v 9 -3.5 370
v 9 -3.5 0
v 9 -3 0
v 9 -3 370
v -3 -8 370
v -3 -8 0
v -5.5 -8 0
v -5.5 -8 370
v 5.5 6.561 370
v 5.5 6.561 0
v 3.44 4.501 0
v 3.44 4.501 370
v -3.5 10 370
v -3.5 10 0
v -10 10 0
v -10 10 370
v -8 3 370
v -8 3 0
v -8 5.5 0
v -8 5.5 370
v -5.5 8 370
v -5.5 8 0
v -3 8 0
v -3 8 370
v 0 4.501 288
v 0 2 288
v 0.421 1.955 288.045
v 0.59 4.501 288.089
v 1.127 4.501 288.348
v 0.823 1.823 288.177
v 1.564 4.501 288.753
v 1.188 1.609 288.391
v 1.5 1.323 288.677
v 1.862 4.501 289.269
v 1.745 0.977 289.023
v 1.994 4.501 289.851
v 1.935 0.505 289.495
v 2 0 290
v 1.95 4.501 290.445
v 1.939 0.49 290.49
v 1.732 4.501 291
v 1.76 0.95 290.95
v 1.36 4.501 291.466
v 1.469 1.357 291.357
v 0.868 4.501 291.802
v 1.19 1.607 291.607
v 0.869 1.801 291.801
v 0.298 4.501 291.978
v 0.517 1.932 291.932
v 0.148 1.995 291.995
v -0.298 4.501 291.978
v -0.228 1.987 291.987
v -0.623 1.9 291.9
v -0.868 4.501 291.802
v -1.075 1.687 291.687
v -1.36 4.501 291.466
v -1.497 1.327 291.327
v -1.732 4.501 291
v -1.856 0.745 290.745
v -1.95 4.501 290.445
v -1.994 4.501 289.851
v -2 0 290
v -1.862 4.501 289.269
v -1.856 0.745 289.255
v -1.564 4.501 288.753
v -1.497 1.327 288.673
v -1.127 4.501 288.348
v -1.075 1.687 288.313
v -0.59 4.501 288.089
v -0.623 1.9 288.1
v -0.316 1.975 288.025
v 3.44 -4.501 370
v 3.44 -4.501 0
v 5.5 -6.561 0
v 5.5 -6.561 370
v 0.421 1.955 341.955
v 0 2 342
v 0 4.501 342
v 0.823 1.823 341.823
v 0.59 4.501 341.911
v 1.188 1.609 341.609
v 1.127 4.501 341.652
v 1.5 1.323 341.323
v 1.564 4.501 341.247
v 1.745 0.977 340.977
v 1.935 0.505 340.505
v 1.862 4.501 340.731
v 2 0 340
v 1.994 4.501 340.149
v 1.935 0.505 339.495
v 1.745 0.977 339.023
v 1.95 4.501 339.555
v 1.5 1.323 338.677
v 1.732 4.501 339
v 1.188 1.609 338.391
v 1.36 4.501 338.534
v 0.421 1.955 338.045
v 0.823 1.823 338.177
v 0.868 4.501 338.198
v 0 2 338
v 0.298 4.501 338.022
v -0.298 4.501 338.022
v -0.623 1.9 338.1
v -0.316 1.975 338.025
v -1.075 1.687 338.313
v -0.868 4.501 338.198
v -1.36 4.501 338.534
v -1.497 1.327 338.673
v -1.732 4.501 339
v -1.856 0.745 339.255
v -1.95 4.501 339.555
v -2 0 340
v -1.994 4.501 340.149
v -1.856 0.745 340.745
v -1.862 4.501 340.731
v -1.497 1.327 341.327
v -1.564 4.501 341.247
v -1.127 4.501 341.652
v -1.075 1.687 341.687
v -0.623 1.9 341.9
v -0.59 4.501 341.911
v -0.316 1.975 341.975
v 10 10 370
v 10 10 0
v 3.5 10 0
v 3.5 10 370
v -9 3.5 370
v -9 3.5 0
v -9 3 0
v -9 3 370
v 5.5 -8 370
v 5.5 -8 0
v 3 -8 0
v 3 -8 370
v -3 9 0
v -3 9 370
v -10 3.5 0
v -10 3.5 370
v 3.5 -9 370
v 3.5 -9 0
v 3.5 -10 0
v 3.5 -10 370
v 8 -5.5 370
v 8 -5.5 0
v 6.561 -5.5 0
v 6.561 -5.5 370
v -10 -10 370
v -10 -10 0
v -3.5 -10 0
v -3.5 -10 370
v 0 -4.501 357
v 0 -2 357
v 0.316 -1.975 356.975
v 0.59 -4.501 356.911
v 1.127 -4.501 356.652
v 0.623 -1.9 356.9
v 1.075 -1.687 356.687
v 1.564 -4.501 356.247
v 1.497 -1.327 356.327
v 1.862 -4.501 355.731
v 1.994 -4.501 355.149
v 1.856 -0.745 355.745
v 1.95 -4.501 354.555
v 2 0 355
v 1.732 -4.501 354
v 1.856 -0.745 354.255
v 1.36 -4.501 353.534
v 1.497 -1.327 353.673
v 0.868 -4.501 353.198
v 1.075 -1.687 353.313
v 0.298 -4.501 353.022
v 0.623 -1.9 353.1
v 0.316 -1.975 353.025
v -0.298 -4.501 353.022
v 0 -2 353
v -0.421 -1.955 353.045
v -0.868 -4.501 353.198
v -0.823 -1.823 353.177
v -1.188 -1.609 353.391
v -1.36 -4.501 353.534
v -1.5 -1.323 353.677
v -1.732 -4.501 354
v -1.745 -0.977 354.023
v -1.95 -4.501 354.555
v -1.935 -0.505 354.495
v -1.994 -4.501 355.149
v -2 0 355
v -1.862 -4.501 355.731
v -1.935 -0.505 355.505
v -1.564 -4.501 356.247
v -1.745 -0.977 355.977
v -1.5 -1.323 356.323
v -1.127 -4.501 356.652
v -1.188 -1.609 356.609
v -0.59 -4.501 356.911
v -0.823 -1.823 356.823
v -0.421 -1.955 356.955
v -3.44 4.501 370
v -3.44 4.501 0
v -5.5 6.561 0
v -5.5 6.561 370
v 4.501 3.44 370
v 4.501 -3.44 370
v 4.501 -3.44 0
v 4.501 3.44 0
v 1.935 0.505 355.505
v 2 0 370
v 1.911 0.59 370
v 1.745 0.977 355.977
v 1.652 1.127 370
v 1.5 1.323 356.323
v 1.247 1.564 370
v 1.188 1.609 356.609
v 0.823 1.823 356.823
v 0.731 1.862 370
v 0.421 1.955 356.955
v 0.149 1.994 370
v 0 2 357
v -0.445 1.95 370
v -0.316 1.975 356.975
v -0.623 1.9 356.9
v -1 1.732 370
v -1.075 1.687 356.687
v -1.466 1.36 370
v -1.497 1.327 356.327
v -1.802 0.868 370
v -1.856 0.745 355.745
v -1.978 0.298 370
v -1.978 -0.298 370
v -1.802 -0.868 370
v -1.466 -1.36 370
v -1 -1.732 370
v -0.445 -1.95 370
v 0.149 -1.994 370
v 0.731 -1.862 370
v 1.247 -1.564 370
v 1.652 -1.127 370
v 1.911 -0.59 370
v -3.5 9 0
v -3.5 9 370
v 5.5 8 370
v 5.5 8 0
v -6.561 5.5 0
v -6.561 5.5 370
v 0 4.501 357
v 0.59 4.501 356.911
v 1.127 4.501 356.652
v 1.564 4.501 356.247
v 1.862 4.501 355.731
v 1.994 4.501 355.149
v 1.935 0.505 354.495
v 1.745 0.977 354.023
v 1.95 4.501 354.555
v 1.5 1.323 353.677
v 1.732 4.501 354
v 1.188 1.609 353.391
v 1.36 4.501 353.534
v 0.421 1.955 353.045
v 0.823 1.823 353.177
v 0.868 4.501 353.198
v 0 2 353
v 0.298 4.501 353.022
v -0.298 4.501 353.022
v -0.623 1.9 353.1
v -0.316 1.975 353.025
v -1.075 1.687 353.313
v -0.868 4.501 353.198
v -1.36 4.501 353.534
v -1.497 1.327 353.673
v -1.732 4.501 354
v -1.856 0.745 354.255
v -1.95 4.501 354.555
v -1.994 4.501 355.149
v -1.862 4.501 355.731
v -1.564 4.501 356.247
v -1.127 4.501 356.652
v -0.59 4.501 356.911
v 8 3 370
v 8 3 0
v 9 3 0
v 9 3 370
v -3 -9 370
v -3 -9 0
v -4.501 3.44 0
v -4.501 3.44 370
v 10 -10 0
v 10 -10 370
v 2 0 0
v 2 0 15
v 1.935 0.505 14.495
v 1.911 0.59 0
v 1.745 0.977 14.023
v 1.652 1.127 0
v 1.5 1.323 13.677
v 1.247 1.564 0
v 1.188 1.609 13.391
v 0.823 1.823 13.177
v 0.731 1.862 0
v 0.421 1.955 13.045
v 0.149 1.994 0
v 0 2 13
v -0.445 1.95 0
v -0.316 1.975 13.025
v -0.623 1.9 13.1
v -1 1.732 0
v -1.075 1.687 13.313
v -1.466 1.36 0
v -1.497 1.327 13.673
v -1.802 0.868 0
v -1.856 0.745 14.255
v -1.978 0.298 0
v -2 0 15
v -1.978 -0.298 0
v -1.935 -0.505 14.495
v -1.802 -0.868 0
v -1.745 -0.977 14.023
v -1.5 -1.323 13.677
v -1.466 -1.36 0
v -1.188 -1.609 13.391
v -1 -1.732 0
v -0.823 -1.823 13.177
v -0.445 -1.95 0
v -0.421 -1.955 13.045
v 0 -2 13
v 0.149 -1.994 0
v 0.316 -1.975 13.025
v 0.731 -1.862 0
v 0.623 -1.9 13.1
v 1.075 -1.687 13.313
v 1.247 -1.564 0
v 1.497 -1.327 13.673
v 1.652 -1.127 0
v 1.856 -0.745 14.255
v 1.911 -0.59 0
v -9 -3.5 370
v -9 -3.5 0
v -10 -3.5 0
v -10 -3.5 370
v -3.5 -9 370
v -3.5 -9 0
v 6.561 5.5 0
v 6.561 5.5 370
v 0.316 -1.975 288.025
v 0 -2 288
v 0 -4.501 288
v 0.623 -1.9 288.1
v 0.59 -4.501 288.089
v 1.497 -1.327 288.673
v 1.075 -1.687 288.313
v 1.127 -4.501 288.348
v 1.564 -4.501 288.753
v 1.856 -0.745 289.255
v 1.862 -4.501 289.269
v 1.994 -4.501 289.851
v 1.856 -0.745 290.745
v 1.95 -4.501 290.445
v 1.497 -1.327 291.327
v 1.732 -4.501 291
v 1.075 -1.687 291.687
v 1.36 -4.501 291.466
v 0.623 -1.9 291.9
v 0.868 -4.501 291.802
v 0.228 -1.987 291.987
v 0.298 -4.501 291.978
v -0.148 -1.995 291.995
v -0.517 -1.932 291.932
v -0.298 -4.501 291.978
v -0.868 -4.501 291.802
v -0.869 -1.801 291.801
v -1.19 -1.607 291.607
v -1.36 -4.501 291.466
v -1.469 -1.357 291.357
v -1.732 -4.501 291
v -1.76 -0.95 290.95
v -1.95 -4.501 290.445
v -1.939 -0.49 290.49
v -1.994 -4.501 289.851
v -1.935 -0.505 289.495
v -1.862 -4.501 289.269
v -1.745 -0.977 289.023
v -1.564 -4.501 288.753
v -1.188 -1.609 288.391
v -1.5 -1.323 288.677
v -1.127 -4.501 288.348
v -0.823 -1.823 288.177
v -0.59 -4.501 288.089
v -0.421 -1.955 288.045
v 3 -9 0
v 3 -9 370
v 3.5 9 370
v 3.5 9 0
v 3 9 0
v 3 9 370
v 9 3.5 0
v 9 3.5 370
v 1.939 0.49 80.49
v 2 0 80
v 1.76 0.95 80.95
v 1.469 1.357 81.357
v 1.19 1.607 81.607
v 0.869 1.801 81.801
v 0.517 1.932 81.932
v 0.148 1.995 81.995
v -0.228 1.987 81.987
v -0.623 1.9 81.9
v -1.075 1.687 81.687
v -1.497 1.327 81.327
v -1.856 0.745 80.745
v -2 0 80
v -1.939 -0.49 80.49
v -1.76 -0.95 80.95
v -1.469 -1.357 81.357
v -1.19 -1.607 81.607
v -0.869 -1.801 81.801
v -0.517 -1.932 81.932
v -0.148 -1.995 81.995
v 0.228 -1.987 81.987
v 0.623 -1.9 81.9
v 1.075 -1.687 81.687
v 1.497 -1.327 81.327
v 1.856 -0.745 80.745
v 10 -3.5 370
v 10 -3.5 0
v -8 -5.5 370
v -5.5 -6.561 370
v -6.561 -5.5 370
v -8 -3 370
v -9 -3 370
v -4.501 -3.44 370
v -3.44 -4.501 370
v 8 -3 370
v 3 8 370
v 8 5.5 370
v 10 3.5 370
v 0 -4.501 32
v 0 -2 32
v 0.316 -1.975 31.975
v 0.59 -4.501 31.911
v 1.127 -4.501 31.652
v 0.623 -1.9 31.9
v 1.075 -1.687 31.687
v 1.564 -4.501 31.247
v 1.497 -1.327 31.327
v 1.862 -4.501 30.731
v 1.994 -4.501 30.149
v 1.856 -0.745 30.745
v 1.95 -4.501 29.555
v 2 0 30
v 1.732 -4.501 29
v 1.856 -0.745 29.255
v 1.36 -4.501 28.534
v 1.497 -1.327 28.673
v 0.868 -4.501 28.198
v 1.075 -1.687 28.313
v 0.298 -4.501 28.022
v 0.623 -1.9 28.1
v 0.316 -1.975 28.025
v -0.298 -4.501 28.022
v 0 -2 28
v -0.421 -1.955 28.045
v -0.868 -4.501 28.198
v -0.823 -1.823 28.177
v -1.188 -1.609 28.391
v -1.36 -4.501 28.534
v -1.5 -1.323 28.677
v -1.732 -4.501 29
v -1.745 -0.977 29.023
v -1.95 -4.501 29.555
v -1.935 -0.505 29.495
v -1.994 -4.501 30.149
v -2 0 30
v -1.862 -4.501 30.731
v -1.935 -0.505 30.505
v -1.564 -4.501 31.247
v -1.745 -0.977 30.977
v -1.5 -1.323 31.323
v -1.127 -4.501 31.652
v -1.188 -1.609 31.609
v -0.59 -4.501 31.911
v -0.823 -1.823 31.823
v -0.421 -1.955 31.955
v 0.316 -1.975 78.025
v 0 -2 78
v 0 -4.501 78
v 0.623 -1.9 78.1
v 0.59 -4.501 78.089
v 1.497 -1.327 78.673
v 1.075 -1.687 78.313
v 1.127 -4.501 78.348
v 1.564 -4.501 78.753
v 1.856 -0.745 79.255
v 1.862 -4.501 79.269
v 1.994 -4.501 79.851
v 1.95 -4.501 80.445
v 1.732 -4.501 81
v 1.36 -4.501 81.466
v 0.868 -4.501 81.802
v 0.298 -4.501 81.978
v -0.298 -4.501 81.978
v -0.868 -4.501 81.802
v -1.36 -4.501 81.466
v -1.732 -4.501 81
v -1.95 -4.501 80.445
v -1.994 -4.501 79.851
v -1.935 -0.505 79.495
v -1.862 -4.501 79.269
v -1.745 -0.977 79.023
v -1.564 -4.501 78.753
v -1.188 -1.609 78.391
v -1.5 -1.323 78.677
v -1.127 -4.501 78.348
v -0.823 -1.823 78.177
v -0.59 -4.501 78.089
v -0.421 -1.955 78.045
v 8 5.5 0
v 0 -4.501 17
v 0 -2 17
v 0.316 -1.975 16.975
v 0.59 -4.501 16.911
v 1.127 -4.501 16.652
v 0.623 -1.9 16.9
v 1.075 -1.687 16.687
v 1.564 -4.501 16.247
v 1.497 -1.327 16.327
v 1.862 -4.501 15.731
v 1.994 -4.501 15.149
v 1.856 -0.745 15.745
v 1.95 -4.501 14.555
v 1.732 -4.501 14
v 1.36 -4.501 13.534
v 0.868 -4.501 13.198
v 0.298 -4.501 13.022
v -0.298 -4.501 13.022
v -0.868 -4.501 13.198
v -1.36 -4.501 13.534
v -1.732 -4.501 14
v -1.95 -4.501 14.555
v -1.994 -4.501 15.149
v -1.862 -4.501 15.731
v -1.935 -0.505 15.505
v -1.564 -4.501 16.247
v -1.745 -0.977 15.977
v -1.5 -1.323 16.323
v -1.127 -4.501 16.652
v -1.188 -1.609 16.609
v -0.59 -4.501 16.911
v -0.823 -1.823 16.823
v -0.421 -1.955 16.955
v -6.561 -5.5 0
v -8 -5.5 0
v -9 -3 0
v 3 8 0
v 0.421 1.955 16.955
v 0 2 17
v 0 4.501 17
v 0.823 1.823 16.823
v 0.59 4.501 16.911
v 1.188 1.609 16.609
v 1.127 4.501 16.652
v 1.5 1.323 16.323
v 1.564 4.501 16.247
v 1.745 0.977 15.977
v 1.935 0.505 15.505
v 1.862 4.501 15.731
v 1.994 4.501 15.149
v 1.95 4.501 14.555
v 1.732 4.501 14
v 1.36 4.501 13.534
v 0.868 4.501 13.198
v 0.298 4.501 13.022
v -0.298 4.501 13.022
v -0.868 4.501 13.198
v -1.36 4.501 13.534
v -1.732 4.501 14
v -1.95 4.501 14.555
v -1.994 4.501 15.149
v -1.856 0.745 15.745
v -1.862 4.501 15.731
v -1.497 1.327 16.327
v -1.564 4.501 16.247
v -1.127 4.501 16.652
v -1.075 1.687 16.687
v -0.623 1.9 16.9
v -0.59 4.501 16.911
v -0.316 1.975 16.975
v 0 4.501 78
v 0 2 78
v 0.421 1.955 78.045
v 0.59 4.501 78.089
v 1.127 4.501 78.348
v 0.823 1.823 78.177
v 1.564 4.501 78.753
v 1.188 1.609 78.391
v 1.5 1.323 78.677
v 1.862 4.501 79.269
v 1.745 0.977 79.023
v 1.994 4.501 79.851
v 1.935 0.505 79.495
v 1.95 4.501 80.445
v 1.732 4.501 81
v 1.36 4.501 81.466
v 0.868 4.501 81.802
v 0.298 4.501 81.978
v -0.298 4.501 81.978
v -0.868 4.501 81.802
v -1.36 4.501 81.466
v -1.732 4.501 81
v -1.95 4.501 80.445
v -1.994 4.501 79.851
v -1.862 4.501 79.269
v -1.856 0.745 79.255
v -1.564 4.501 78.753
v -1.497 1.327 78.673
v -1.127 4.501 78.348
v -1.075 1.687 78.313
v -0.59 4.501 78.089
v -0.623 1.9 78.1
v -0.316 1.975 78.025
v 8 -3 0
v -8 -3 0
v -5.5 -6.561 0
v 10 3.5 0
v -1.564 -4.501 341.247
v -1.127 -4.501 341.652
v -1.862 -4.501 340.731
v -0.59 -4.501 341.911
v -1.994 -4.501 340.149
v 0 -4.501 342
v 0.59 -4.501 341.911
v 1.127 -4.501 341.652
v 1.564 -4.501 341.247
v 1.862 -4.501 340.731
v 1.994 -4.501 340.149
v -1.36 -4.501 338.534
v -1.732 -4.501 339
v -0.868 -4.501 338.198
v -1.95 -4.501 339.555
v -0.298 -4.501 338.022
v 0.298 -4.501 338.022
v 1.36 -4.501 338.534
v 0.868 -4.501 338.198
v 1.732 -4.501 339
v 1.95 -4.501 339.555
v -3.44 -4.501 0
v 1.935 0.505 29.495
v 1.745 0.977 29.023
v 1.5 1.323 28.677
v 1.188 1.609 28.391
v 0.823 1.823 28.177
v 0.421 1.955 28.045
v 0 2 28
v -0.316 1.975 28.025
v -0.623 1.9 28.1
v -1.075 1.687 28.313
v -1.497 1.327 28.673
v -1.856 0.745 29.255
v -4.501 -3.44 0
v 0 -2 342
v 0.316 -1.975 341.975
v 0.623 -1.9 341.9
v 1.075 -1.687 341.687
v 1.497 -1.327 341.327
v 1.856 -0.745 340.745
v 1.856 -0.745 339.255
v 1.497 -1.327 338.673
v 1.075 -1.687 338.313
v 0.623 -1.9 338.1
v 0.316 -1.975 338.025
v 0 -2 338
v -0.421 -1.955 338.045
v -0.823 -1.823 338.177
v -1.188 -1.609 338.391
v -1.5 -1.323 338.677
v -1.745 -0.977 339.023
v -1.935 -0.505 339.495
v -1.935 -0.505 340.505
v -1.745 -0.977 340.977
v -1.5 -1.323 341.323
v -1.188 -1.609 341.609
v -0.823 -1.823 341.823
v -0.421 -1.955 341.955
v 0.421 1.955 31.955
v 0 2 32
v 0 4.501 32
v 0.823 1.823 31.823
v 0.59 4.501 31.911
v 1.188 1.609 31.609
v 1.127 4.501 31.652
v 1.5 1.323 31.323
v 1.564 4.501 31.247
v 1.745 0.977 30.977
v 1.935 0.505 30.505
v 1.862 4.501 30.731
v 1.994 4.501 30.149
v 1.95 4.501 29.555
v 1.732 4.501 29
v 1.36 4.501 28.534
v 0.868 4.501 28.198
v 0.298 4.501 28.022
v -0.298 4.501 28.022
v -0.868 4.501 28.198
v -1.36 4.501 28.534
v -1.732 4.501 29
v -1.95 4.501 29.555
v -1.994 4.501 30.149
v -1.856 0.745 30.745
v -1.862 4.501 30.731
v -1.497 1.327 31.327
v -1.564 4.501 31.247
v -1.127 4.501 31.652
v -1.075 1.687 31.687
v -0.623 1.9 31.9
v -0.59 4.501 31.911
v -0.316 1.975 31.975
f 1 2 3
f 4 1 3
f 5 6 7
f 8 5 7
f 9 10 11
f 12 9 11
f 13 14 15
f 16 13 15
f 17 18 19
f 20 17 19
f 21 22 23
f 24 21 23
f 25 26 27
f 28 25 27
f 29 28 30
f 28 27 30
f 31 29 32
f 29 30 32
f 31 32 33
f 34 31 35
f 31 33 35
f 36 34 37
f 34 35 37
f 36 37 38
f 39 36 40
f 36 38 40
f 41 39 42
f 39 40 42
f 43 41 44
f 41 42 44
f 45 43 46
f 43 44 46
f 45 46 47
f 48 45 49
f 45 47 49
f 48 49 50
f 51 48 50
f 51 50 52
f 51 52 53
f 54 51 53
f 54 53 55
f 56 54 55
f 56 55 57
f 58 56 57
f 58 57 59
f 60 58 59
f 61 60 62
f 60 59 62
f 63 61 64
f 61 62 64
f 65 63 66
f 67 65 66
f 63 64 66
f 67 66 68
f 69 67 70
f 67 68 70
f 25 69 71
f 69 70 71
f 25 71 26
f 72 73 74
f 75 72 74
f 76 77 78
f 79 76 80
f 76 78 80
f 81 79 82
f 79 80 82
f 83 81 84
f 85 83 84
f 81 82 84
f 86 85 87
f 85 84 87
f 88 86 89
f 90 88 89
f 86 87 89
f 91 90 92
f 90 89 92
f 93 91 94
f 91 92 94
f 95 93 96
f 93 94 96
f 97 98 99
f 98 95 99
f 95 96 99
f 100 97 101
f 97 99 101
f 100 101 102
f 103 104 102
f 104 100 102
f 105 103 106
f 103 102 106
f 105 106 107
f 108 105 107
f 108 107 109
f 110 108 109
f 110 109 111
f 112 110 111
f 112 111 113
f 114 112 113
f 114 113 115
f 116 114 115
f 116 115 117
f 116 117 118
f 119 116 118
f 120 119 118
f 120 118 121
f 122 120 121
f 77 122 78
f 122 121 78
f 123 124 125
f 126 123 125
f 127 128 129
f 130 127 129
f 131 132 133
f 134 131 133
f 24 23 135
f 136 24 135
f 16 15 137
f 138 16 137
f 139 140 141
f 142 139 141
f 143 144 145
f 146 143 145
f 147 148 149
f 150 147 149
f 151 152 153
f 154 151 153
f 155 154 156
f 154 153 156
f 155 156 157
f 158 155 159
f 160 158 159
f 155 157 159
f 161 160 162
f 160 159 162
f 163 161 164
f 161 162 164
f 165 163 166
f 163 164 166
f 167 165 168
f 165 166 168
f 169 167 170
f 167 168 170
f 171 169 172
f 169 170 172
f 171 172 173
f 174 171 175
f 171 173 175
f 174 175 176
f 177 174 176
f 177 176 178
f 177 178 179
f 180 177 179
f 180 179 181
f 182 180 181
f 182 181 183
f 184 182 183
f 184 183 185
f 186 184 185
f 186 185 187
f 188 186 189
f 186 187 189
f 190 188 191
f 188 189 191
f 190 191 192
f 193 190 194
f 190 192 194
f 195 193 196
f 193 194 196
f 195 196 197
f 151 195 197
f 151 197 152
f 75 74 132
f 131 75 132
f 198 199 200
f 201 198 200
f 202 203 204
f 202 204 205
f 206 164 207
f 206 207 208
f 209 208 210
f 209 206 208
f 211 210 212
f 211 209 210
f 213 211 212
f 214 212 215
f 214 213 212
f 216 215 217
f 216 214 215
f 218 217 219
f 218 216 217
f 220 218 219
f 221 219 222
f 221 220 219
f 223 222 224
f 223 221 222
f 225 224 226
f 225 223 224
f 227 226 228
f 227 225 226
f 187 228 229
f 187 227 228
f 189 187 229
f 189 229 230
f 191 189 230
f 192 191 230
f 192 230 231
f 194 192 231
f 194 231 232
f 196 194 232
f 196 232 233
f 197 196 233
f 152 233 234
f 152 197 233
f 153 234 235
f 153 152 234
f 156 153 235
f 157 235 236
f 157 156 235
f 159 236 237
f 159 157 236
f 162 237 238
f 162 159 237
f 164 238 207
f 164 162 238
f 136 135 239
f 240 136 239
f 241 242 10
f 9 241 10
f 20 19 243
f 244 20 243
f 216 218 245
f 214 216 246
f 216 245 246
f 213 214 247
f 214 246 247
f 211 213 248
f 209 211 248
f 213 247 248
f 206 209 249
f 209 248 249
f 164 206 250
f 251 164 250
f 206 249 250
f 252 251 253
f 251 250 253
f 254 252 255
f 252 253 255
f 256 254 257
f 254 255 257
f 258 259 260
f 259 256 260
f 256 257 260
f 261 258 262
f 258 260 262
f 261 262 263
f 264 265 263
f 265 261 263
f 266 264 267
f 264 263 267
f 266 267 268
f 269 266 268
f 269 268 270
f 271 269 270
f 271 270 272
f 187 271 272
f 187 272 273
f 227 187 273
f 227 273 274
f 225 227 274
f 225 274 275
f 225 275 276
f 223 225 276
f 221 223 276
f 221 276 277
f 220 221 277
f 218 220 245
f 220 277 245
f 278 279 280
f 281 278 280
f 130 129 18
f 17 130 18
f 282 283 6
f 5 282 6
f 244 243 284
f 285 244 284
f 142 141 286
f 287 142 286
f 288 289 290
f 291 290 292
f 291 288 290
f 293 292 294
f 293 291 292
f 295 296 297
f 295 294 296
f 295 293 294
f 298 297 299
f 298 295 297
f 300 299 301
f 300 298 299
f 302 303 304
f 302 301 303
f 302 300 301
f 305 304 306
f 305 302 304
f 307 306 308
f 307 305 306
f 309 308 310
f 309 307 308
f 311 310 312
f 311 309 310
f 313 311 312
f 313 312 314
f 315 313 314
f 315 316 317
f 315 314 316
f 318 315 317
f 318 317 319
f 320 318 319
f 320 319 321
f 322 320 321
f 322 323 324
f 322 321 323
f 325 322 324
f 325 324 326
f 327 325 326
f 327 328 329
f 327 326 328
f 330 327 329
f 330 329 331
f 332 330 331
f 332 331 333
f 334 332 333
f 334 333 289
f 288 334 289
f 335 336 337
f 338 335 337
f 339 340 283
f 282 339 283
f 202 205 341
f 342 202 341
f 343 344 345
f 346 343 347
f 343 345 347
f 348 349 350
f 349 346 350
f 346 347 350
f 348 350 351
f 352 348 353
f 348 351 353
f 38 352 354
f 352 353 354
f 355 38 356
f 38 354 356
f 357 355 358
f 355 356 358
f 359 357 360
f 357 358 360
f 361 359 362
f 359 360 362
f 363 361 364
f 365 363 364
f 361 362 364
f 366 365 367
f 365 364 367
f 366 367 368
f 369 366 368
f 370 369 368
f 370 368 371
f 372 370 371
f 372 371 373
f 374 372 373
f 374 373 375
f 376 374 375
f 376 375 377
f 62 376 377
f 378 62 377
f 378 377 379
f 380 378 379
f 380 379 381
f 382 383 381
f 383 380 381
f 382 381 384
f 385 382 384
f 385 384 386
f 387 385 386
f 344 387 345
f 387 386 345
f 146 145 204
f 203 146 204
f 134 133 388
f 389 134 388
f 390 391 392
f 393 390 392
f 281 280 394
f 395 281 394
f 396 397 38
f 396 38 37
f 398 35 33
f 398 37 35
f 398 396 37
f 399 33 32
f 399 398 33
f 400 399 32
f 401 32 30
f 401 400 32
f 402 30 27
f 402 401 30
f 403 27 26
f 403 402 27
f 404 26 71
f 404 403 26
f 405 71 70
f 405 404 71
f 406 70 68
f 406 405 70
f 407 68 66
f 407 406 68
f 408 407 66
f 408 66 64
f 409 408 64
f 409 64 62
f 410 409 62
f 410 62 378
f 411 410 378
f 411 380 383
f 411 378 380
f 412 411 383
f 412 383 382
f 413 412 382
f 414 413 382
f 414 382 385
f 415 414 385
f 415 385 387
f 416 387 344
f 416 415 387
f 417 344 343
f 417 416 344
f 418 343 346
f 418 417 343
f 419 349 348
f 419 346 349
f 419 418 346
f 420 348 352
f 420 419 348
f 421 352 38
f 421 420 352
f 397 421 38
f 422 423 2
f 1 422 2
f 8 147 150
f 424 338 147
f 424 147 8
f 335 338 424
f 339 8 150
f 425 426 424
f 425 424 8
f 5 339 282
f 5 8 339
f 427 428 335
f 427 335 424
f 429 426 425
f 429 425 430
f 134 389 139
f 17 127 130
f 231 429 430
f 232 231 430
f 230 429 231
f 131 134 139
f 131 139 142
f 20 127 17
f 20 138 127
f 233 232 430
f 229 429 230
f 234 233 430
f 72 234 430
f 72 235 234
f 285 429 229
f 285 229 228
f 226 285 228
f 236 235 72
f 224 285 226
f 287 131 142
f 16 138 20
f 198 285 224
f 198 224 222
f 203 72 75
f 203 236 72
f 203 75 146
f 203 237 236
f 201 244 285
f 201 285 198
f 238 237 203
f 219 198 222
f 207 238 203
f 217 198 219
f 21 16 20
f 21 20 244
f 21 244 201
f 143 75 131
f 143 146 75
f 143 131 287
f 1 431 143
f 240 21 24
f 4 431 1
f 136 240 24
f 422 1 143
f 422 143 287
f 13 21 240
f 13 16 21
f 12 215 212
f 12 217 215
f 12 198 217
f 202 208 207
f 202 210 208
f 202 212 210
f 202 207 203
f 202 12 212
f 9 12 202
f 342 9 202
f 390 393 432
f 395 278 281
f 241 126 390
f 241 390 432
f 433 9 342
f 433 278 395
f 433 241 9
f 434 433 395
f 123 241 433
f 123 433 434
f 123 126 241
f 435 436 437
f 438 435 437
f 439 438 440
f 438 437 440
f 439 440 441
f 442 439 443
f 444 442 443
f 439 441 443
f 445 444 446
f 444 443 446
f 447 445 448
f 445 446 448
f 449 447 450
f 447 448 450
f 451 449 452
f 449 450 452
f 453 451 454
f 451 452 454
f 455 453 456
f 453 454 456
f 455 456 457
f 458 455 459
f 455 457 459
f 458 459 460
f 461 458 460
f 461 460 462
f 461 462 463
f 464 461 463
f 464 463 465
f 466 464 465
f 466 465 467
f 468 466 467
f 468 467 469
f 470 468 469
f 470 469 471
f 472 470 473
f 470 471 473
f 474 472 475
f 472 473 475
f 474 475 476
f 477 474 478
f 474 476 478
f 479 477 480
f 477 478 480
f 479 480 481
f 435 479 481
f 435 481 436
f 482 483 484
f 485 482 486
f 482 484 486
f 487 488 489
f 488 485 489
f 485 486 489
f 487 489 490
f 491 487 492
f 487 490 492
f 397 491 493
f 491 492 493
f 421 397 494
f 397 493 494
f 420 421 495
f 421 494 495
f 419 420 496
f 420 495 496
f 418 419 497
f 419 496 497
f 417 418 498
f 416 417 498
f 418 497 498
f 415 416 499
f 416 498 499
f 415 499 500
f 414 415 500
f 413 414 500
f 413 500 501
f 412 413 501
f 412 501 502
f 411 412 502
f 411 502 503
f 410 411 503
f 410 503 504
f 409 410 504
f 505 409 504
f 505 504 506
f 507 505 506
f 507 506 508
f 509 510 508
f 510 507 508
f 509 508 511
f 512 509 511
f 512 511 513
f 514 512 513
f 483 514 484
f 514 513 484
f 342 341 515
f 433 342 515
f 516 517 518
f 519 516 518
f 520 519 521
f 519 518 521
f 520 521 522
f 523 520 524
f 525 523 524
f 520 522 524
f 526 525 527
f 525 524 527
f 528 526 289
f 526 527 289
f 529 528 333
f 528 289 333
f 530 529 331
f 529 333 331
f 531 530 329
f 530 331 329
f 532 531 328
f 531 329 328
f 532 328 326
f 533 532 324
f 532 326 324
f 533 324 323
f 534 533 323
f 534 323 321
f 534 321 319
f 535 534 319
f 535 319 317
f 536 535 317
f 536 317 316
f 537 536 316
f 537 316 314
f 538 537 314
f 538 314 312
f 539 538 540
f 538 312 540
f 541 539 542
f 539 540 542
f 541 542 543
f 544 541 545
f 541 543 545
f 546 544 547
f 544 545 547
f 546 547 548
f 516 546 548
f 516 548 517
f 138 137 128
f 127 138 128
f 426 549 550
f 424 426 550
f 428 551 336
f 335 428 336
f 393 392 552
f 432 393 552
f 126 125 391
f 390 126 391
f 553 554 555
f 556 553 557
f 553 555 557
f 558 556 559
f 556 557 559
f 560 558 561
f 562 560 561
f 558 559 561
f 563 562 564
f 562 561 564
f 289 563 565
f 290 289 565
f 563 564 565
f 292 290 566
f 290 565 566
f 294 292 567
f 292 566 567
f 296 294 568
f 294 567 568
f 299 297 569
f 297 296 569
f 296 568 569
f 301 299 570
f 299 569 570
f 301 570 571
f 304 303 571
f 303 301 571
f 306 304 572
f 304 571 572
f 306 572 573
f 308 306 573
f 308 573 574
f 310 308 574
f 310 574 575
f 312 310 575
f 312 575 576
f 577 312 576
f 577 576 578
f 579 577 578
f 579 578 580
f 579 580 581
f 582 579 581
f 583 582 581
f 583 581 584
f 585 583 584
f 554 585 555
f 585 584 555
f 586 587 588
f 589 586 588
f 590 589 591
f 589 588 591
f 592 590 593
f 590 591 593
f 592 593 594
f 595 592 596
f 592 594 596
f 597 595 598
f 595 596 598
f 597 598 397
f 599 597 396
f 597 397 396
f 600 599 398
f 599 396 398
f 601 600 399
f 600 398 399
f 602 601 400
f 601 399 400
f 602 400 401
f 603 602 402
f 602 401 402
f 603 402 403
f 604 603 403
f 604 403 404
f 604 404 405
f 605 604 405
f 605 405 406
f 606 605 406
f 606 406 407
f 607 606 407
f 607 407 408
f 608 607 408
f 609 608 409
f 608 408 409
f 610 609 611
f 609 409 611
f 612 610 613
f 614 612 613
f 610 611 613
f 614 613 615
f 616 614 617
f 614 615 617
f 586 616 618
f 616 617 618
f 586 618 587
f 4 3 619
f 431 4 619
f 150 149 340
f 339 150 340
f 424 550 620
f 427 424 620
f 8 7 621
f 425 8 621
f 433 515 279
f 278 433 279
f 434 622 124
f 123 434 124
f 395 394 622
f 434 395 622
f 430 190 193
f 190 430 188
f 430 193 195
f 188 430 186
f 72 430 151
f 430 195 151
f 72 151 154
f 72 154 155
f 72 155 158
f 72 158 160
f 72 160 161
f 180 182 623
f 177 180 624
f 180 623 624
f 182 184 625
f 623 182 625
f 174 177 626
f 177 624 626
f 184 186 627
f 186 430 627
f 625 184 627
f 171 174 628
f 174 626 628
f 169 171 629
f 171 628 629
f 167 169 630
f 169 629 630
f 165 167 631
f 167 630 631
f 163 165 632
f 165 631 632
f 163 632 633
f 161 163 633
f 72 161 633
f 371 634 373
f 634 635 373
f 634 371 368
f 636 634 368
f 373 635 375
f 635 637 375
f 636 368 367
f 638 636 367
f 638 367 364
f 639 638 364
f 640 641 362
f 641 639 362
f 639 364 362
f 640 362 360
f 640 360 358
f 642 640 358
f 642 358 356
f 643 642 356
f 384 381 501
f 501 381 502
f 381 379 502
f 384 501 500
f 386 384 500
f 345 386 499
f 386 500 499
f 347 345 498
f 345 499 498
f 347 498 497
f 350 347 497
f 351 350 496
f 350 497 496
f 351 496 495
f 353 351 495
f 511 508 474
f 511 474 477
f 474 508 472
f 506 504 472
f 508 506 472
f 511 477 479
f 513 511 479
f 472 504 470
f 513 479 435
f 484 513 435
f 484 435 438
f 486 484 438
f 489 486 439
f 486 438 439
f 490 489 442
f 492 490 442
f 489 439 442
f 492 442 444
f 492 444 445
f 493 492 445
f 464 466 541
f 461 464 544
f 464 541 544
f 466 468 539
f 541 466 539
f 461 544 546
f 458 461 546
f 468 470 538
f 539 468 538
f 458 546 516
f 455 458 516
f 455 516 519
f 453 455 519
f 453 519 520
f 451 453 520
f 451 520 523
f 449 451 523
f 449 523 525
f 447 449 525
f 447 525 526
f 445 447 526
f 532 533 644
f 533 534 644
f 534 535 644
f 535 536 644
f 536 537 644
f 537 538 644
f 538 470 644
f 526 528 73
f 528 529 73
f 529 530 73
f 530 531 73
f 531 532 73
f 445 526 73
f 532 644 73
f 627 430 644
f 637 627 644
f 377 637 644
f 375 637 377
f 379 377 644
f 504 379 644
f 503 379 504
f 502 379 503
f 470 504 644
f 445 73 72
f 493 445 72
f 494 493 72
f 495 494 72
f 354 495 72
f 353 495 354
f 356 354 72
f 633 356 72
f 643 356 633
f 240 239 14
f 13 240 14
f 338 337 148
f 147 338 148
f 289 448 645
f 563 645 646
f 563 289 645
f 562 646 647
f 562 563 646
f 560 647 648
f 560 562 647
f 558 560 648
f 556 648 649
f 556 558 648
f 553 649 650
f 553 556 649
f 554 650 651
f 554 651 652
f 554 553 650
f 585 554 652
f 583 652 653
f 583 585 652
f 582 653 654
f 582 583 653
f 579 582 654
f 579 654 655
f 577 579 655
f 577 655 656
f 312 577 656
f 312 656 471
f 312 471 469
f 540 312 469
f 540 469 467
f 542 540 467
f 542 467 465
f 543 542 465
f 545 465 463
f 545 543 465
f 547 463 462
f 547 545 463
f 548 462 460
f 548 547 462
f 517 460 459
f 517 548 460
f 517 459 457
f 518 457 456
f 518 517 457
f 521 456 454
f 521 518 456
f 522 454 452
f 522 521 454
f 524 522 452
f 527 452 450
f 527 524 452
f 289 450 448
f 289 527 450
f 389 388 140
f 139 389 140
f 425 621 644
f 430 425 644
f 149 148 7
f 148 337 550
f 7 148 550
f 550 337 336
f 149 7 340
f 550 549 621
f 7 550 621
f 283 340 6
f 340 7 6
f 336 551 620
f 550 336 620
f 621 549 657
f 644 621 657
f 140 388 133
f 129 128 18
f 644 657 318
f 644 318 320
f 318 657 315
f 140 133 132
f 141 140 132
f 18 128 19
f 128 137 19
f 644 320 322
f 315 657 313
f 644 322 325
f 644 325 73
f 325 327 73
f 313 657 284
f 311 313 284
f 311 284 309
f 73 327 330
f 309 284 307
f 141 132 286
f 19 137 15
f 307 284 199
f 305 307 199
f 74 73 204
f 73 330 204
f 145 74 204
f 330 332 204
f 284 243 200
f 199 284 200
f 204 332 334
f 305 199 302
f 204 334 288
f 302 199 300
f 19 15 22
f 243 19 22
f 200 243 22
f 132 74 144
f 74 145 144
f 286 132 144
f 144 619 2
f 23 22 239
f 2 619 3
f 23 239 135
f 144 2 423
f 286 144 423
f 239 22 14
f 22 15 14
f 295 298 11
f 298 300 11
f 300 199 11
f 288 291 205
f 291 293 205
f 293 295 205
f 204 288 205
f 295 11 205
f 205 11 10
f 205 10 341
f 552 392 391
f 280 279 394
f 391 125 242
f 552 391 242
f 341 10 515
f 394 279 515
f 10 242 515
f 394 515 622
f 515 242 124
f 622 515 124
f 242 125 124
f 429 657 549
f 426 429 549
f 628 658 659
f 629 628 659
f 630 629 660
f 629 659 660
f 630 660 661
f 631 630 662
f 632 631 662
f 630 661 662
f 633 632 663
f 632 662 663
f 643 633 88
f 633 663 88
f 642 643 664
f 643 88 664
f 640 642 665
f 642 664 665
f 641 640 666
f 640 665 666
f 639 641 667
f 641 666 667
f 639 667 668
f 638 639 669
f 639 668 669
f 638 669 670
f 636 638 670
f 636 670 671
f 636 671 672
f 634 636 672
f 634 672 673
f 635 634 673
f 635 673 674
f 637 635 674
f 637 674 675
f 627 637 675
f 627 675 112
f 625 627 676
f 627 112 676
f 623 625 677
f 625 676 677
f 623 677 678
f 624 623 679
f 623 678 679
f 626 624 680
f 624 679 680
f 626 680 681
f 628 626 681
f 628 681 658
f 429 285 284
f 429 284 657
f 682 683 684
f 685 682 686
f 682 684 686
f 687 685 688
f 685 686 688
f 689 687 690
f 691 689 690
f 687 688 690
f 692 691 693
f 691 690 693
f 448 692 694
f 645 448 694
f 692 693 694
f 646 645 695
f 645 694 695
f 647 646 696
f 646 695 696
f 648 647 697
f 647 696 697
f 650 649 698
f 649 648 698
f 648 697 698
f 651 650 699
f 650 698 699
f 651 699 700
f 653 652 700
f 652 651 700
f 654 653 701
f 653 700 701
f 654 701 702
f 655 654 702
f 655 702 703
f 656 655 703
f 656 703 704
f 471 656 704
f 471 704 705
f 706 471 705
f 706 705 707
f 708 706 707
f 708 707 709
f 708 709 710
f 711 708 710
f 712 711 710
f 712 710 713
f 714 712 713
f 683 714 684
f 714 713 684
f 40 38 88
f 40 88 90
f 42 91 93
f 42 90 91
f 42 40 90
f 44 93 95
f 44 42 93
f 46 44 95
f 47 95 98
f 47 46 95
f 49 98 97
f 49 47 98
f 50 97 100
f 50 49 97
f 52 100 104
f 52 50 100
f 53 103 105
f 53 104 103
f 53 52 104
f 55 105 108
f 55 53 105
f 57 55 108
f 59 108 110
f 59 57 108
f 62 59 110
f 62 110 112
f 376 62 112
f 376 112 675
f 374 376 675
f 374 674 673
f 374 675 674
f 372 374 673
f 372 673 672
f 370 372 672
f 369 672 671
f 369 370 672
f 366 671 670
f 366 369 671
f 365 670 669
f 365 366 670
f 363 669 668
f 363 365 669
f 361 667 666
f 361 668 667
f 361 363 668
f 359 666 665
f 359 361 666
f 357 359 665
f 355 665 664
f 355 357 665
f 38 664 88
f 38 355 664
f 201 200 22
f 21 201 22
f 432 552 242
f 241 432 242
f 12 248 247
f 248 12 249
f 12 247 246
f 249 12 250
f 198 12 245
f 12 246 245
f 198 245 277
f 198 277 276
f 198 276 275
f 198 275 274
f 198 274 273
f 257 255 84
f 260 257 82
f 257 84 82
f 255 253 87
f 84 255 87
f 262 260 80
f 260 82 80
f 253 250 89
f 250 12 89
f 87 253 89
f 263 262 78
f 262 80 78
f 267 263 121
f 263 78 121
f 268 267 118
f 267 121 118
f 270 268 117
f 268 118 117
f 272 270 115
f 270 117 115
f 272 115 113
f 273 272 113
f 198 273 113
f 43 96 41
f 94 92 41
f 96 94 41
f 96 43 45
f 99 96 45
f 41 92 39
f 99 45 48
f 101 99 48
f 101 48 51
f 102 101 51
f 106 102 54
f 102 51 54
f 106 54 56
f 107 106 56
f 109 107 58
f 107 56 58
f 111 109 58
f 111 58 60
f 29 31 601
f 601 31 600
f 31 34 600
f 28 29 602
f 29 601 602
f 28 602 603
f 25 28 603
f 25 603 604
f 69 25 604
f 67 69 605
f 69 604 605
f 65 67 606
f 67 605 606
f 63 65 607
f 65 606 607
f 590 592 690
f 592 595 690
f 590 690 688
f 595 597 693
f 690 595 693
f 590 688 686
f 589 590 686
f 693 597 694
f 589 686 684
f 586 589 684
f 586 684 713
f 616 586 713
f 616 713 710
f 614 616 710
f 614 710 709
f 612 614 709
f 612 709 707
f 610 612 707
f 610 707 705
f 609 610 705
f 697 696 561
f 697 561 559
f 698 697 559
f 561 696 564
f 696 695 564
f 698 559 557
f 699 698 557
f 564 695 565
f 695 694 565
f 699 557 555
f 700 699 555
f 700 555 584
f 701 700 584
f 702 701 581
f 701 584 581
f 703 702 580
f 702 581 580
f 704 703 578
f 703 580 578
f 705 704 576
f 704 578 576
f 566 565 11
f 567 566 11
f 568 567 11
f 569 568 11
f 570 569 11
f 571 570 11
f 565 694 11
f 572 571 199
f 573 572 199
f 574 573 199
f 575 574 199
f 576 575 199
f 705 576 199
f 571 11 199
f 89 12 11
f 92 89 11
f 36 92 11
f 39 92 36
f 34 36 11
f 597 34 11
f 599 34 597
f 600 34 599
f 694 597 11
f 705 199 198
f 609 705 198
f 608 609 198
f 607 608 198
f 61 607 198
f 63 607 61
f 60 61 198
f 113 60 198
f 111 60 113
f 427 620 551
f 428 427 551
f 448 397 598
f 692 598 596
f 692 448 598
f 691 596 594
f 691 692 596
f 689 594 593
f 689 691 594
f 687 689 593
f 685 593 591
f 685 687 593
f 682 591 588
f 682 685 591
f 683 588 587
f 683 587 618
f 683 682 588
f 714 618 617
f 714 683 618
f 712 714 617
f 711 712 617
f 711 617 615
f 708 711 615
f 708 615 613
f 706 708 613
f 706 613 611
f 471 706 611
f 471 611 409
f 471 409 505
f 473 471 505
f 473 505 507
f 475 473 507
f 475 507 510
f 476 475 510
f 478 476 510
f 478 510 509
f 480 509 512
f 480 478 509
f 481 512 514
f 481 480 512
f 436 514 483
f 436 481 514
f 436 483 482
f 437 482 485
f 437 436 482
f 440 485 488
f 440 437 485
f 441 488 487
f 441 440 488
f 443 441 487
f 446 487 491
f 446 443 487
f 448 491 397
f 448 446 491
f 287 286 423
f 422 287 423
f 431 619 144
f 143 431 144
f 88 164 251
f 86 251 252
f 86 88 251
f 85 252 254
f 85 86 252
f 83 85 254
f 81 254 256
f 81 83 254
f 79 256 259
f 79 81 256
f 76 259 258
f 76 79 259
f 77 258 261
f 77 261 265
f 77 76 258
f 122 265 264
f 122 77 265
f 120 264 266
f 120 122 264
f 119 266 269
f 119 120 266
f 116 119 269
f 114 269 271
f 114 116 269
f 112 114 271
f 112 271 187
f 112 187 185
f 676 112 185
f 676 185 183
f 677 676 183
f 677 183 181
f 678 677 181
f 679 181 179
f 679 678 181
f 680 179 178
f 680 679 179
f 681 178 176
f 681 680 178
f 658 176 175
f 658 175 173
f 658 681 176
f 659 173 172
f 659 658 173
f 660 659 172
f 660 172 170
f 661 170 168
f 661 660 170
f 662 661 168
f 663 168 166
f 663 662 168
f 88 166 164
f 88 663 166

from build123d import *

# Parameters (mm, degrees)
SKETCH1_R           = 2
BOSS_EXTRUDE1_DEPTH = 370
SKETCH2_R           = 2
CUT_EXTRUDE1_DEPTH  = 27
SKETCH3_R           = 2
CUT_EXTRUDE2_DEPTH  = 28


with BuildPart() as part:
    # Sketch1 → Boss-Extrude1 (new body)
    with BuildSketch(Plane.XY):
        Polygon((-10, -10), (-3.5, -10), (-3.5, -9), (-3, -9), (-3, -8), (-5.5, -8), (-5.5, -6.560660172), (-3.44, -4.500660172), (3.44, -4.500660172), (5.5, -6.560660172), (5.5, -8), (3, -8), (3, -9), (3.5, -9), (3.5, -10), (10, -10), (10, -3.5), (9, -3.5), (9, -3), (8, -3), (8, -5.5), (6.560660172, -5.5), (4.500660172, -3.44), (4.500660172, 3.44), (6.560660172, 5.5), (8, 5.5), (8, 3), (9, 3), (9, 3.5), (10, 3.5), (10, 10), (3.5, 10), (3.5, 9), (3, 9), (3, 8), (5.5, 8), (5.5, 6.560660172), (3.44, 4.500660172), (-3.44, 4.500660172), (-5.5, 6.560660172), (-5.5, 8), (-3, 8), (-3, 9), (-3.5, 9), (-3.5, 10), (-10, 10), (-10, 3.5), (-9, 3.5), (-9, 3), (-8, 3), (-8, 5.5), (-6.560660172, 5.5), (-4.500660172, 3.44), (-4.500660172, -3.44), (-6.560660172, -5.5), (-8, -5.5), (-8, -3), (-9, -3), (-9, -3.5), (-10, -3.5), align=None)
        Circle(SKETCH1_R, mode=Mode.SUBTRACT)
    extrude(amount=BOSS_EXTRUDE1_DEPTH)

    # Sketch2 → Cut-Extrude1 (cut)
    with BuildSketch(Plane(origin=(0, 10, 0), x_dir=(1, 0, 0), z_dir=(0, 1, 0))):
        with Locations(Location((0, -15, 0), (0, 0, 270))):
            Circle(SKETCH2_R)
        with Locations(Location((0, -30, 0), (0, 0, 270))):
            Circle(SKETCH2_R)
        with Locations(Location((0, -355, 0), (0, 0, 270))):
            Circle(SKETCH2_R)
        with Locations(Location((0, -340, 0), (0, 0, 270))):
            Circle(SKETCH2_R)
    extrude(amount=-CUT_EXTRUDE1_DEPTH, mode=Mode.SUBTRACT)

    # Sketch3 → Cut-Extrude2 (cut)
    with BuildSketch(Plane.XZ.offset(4.500660172)):
        with Locations(Location((0, 80, 0), (0, 0, 270))):
            Circle(SKETCH3_R)
        with Locations(Location((0, 290, 0), (0, 0, 270))):
            Circle(SKETCH3_R)
    extrude(amount=-CUT_EXTRUDE2_DEPTH, mode=Mode.SUBTRACT)


solid = part.part
